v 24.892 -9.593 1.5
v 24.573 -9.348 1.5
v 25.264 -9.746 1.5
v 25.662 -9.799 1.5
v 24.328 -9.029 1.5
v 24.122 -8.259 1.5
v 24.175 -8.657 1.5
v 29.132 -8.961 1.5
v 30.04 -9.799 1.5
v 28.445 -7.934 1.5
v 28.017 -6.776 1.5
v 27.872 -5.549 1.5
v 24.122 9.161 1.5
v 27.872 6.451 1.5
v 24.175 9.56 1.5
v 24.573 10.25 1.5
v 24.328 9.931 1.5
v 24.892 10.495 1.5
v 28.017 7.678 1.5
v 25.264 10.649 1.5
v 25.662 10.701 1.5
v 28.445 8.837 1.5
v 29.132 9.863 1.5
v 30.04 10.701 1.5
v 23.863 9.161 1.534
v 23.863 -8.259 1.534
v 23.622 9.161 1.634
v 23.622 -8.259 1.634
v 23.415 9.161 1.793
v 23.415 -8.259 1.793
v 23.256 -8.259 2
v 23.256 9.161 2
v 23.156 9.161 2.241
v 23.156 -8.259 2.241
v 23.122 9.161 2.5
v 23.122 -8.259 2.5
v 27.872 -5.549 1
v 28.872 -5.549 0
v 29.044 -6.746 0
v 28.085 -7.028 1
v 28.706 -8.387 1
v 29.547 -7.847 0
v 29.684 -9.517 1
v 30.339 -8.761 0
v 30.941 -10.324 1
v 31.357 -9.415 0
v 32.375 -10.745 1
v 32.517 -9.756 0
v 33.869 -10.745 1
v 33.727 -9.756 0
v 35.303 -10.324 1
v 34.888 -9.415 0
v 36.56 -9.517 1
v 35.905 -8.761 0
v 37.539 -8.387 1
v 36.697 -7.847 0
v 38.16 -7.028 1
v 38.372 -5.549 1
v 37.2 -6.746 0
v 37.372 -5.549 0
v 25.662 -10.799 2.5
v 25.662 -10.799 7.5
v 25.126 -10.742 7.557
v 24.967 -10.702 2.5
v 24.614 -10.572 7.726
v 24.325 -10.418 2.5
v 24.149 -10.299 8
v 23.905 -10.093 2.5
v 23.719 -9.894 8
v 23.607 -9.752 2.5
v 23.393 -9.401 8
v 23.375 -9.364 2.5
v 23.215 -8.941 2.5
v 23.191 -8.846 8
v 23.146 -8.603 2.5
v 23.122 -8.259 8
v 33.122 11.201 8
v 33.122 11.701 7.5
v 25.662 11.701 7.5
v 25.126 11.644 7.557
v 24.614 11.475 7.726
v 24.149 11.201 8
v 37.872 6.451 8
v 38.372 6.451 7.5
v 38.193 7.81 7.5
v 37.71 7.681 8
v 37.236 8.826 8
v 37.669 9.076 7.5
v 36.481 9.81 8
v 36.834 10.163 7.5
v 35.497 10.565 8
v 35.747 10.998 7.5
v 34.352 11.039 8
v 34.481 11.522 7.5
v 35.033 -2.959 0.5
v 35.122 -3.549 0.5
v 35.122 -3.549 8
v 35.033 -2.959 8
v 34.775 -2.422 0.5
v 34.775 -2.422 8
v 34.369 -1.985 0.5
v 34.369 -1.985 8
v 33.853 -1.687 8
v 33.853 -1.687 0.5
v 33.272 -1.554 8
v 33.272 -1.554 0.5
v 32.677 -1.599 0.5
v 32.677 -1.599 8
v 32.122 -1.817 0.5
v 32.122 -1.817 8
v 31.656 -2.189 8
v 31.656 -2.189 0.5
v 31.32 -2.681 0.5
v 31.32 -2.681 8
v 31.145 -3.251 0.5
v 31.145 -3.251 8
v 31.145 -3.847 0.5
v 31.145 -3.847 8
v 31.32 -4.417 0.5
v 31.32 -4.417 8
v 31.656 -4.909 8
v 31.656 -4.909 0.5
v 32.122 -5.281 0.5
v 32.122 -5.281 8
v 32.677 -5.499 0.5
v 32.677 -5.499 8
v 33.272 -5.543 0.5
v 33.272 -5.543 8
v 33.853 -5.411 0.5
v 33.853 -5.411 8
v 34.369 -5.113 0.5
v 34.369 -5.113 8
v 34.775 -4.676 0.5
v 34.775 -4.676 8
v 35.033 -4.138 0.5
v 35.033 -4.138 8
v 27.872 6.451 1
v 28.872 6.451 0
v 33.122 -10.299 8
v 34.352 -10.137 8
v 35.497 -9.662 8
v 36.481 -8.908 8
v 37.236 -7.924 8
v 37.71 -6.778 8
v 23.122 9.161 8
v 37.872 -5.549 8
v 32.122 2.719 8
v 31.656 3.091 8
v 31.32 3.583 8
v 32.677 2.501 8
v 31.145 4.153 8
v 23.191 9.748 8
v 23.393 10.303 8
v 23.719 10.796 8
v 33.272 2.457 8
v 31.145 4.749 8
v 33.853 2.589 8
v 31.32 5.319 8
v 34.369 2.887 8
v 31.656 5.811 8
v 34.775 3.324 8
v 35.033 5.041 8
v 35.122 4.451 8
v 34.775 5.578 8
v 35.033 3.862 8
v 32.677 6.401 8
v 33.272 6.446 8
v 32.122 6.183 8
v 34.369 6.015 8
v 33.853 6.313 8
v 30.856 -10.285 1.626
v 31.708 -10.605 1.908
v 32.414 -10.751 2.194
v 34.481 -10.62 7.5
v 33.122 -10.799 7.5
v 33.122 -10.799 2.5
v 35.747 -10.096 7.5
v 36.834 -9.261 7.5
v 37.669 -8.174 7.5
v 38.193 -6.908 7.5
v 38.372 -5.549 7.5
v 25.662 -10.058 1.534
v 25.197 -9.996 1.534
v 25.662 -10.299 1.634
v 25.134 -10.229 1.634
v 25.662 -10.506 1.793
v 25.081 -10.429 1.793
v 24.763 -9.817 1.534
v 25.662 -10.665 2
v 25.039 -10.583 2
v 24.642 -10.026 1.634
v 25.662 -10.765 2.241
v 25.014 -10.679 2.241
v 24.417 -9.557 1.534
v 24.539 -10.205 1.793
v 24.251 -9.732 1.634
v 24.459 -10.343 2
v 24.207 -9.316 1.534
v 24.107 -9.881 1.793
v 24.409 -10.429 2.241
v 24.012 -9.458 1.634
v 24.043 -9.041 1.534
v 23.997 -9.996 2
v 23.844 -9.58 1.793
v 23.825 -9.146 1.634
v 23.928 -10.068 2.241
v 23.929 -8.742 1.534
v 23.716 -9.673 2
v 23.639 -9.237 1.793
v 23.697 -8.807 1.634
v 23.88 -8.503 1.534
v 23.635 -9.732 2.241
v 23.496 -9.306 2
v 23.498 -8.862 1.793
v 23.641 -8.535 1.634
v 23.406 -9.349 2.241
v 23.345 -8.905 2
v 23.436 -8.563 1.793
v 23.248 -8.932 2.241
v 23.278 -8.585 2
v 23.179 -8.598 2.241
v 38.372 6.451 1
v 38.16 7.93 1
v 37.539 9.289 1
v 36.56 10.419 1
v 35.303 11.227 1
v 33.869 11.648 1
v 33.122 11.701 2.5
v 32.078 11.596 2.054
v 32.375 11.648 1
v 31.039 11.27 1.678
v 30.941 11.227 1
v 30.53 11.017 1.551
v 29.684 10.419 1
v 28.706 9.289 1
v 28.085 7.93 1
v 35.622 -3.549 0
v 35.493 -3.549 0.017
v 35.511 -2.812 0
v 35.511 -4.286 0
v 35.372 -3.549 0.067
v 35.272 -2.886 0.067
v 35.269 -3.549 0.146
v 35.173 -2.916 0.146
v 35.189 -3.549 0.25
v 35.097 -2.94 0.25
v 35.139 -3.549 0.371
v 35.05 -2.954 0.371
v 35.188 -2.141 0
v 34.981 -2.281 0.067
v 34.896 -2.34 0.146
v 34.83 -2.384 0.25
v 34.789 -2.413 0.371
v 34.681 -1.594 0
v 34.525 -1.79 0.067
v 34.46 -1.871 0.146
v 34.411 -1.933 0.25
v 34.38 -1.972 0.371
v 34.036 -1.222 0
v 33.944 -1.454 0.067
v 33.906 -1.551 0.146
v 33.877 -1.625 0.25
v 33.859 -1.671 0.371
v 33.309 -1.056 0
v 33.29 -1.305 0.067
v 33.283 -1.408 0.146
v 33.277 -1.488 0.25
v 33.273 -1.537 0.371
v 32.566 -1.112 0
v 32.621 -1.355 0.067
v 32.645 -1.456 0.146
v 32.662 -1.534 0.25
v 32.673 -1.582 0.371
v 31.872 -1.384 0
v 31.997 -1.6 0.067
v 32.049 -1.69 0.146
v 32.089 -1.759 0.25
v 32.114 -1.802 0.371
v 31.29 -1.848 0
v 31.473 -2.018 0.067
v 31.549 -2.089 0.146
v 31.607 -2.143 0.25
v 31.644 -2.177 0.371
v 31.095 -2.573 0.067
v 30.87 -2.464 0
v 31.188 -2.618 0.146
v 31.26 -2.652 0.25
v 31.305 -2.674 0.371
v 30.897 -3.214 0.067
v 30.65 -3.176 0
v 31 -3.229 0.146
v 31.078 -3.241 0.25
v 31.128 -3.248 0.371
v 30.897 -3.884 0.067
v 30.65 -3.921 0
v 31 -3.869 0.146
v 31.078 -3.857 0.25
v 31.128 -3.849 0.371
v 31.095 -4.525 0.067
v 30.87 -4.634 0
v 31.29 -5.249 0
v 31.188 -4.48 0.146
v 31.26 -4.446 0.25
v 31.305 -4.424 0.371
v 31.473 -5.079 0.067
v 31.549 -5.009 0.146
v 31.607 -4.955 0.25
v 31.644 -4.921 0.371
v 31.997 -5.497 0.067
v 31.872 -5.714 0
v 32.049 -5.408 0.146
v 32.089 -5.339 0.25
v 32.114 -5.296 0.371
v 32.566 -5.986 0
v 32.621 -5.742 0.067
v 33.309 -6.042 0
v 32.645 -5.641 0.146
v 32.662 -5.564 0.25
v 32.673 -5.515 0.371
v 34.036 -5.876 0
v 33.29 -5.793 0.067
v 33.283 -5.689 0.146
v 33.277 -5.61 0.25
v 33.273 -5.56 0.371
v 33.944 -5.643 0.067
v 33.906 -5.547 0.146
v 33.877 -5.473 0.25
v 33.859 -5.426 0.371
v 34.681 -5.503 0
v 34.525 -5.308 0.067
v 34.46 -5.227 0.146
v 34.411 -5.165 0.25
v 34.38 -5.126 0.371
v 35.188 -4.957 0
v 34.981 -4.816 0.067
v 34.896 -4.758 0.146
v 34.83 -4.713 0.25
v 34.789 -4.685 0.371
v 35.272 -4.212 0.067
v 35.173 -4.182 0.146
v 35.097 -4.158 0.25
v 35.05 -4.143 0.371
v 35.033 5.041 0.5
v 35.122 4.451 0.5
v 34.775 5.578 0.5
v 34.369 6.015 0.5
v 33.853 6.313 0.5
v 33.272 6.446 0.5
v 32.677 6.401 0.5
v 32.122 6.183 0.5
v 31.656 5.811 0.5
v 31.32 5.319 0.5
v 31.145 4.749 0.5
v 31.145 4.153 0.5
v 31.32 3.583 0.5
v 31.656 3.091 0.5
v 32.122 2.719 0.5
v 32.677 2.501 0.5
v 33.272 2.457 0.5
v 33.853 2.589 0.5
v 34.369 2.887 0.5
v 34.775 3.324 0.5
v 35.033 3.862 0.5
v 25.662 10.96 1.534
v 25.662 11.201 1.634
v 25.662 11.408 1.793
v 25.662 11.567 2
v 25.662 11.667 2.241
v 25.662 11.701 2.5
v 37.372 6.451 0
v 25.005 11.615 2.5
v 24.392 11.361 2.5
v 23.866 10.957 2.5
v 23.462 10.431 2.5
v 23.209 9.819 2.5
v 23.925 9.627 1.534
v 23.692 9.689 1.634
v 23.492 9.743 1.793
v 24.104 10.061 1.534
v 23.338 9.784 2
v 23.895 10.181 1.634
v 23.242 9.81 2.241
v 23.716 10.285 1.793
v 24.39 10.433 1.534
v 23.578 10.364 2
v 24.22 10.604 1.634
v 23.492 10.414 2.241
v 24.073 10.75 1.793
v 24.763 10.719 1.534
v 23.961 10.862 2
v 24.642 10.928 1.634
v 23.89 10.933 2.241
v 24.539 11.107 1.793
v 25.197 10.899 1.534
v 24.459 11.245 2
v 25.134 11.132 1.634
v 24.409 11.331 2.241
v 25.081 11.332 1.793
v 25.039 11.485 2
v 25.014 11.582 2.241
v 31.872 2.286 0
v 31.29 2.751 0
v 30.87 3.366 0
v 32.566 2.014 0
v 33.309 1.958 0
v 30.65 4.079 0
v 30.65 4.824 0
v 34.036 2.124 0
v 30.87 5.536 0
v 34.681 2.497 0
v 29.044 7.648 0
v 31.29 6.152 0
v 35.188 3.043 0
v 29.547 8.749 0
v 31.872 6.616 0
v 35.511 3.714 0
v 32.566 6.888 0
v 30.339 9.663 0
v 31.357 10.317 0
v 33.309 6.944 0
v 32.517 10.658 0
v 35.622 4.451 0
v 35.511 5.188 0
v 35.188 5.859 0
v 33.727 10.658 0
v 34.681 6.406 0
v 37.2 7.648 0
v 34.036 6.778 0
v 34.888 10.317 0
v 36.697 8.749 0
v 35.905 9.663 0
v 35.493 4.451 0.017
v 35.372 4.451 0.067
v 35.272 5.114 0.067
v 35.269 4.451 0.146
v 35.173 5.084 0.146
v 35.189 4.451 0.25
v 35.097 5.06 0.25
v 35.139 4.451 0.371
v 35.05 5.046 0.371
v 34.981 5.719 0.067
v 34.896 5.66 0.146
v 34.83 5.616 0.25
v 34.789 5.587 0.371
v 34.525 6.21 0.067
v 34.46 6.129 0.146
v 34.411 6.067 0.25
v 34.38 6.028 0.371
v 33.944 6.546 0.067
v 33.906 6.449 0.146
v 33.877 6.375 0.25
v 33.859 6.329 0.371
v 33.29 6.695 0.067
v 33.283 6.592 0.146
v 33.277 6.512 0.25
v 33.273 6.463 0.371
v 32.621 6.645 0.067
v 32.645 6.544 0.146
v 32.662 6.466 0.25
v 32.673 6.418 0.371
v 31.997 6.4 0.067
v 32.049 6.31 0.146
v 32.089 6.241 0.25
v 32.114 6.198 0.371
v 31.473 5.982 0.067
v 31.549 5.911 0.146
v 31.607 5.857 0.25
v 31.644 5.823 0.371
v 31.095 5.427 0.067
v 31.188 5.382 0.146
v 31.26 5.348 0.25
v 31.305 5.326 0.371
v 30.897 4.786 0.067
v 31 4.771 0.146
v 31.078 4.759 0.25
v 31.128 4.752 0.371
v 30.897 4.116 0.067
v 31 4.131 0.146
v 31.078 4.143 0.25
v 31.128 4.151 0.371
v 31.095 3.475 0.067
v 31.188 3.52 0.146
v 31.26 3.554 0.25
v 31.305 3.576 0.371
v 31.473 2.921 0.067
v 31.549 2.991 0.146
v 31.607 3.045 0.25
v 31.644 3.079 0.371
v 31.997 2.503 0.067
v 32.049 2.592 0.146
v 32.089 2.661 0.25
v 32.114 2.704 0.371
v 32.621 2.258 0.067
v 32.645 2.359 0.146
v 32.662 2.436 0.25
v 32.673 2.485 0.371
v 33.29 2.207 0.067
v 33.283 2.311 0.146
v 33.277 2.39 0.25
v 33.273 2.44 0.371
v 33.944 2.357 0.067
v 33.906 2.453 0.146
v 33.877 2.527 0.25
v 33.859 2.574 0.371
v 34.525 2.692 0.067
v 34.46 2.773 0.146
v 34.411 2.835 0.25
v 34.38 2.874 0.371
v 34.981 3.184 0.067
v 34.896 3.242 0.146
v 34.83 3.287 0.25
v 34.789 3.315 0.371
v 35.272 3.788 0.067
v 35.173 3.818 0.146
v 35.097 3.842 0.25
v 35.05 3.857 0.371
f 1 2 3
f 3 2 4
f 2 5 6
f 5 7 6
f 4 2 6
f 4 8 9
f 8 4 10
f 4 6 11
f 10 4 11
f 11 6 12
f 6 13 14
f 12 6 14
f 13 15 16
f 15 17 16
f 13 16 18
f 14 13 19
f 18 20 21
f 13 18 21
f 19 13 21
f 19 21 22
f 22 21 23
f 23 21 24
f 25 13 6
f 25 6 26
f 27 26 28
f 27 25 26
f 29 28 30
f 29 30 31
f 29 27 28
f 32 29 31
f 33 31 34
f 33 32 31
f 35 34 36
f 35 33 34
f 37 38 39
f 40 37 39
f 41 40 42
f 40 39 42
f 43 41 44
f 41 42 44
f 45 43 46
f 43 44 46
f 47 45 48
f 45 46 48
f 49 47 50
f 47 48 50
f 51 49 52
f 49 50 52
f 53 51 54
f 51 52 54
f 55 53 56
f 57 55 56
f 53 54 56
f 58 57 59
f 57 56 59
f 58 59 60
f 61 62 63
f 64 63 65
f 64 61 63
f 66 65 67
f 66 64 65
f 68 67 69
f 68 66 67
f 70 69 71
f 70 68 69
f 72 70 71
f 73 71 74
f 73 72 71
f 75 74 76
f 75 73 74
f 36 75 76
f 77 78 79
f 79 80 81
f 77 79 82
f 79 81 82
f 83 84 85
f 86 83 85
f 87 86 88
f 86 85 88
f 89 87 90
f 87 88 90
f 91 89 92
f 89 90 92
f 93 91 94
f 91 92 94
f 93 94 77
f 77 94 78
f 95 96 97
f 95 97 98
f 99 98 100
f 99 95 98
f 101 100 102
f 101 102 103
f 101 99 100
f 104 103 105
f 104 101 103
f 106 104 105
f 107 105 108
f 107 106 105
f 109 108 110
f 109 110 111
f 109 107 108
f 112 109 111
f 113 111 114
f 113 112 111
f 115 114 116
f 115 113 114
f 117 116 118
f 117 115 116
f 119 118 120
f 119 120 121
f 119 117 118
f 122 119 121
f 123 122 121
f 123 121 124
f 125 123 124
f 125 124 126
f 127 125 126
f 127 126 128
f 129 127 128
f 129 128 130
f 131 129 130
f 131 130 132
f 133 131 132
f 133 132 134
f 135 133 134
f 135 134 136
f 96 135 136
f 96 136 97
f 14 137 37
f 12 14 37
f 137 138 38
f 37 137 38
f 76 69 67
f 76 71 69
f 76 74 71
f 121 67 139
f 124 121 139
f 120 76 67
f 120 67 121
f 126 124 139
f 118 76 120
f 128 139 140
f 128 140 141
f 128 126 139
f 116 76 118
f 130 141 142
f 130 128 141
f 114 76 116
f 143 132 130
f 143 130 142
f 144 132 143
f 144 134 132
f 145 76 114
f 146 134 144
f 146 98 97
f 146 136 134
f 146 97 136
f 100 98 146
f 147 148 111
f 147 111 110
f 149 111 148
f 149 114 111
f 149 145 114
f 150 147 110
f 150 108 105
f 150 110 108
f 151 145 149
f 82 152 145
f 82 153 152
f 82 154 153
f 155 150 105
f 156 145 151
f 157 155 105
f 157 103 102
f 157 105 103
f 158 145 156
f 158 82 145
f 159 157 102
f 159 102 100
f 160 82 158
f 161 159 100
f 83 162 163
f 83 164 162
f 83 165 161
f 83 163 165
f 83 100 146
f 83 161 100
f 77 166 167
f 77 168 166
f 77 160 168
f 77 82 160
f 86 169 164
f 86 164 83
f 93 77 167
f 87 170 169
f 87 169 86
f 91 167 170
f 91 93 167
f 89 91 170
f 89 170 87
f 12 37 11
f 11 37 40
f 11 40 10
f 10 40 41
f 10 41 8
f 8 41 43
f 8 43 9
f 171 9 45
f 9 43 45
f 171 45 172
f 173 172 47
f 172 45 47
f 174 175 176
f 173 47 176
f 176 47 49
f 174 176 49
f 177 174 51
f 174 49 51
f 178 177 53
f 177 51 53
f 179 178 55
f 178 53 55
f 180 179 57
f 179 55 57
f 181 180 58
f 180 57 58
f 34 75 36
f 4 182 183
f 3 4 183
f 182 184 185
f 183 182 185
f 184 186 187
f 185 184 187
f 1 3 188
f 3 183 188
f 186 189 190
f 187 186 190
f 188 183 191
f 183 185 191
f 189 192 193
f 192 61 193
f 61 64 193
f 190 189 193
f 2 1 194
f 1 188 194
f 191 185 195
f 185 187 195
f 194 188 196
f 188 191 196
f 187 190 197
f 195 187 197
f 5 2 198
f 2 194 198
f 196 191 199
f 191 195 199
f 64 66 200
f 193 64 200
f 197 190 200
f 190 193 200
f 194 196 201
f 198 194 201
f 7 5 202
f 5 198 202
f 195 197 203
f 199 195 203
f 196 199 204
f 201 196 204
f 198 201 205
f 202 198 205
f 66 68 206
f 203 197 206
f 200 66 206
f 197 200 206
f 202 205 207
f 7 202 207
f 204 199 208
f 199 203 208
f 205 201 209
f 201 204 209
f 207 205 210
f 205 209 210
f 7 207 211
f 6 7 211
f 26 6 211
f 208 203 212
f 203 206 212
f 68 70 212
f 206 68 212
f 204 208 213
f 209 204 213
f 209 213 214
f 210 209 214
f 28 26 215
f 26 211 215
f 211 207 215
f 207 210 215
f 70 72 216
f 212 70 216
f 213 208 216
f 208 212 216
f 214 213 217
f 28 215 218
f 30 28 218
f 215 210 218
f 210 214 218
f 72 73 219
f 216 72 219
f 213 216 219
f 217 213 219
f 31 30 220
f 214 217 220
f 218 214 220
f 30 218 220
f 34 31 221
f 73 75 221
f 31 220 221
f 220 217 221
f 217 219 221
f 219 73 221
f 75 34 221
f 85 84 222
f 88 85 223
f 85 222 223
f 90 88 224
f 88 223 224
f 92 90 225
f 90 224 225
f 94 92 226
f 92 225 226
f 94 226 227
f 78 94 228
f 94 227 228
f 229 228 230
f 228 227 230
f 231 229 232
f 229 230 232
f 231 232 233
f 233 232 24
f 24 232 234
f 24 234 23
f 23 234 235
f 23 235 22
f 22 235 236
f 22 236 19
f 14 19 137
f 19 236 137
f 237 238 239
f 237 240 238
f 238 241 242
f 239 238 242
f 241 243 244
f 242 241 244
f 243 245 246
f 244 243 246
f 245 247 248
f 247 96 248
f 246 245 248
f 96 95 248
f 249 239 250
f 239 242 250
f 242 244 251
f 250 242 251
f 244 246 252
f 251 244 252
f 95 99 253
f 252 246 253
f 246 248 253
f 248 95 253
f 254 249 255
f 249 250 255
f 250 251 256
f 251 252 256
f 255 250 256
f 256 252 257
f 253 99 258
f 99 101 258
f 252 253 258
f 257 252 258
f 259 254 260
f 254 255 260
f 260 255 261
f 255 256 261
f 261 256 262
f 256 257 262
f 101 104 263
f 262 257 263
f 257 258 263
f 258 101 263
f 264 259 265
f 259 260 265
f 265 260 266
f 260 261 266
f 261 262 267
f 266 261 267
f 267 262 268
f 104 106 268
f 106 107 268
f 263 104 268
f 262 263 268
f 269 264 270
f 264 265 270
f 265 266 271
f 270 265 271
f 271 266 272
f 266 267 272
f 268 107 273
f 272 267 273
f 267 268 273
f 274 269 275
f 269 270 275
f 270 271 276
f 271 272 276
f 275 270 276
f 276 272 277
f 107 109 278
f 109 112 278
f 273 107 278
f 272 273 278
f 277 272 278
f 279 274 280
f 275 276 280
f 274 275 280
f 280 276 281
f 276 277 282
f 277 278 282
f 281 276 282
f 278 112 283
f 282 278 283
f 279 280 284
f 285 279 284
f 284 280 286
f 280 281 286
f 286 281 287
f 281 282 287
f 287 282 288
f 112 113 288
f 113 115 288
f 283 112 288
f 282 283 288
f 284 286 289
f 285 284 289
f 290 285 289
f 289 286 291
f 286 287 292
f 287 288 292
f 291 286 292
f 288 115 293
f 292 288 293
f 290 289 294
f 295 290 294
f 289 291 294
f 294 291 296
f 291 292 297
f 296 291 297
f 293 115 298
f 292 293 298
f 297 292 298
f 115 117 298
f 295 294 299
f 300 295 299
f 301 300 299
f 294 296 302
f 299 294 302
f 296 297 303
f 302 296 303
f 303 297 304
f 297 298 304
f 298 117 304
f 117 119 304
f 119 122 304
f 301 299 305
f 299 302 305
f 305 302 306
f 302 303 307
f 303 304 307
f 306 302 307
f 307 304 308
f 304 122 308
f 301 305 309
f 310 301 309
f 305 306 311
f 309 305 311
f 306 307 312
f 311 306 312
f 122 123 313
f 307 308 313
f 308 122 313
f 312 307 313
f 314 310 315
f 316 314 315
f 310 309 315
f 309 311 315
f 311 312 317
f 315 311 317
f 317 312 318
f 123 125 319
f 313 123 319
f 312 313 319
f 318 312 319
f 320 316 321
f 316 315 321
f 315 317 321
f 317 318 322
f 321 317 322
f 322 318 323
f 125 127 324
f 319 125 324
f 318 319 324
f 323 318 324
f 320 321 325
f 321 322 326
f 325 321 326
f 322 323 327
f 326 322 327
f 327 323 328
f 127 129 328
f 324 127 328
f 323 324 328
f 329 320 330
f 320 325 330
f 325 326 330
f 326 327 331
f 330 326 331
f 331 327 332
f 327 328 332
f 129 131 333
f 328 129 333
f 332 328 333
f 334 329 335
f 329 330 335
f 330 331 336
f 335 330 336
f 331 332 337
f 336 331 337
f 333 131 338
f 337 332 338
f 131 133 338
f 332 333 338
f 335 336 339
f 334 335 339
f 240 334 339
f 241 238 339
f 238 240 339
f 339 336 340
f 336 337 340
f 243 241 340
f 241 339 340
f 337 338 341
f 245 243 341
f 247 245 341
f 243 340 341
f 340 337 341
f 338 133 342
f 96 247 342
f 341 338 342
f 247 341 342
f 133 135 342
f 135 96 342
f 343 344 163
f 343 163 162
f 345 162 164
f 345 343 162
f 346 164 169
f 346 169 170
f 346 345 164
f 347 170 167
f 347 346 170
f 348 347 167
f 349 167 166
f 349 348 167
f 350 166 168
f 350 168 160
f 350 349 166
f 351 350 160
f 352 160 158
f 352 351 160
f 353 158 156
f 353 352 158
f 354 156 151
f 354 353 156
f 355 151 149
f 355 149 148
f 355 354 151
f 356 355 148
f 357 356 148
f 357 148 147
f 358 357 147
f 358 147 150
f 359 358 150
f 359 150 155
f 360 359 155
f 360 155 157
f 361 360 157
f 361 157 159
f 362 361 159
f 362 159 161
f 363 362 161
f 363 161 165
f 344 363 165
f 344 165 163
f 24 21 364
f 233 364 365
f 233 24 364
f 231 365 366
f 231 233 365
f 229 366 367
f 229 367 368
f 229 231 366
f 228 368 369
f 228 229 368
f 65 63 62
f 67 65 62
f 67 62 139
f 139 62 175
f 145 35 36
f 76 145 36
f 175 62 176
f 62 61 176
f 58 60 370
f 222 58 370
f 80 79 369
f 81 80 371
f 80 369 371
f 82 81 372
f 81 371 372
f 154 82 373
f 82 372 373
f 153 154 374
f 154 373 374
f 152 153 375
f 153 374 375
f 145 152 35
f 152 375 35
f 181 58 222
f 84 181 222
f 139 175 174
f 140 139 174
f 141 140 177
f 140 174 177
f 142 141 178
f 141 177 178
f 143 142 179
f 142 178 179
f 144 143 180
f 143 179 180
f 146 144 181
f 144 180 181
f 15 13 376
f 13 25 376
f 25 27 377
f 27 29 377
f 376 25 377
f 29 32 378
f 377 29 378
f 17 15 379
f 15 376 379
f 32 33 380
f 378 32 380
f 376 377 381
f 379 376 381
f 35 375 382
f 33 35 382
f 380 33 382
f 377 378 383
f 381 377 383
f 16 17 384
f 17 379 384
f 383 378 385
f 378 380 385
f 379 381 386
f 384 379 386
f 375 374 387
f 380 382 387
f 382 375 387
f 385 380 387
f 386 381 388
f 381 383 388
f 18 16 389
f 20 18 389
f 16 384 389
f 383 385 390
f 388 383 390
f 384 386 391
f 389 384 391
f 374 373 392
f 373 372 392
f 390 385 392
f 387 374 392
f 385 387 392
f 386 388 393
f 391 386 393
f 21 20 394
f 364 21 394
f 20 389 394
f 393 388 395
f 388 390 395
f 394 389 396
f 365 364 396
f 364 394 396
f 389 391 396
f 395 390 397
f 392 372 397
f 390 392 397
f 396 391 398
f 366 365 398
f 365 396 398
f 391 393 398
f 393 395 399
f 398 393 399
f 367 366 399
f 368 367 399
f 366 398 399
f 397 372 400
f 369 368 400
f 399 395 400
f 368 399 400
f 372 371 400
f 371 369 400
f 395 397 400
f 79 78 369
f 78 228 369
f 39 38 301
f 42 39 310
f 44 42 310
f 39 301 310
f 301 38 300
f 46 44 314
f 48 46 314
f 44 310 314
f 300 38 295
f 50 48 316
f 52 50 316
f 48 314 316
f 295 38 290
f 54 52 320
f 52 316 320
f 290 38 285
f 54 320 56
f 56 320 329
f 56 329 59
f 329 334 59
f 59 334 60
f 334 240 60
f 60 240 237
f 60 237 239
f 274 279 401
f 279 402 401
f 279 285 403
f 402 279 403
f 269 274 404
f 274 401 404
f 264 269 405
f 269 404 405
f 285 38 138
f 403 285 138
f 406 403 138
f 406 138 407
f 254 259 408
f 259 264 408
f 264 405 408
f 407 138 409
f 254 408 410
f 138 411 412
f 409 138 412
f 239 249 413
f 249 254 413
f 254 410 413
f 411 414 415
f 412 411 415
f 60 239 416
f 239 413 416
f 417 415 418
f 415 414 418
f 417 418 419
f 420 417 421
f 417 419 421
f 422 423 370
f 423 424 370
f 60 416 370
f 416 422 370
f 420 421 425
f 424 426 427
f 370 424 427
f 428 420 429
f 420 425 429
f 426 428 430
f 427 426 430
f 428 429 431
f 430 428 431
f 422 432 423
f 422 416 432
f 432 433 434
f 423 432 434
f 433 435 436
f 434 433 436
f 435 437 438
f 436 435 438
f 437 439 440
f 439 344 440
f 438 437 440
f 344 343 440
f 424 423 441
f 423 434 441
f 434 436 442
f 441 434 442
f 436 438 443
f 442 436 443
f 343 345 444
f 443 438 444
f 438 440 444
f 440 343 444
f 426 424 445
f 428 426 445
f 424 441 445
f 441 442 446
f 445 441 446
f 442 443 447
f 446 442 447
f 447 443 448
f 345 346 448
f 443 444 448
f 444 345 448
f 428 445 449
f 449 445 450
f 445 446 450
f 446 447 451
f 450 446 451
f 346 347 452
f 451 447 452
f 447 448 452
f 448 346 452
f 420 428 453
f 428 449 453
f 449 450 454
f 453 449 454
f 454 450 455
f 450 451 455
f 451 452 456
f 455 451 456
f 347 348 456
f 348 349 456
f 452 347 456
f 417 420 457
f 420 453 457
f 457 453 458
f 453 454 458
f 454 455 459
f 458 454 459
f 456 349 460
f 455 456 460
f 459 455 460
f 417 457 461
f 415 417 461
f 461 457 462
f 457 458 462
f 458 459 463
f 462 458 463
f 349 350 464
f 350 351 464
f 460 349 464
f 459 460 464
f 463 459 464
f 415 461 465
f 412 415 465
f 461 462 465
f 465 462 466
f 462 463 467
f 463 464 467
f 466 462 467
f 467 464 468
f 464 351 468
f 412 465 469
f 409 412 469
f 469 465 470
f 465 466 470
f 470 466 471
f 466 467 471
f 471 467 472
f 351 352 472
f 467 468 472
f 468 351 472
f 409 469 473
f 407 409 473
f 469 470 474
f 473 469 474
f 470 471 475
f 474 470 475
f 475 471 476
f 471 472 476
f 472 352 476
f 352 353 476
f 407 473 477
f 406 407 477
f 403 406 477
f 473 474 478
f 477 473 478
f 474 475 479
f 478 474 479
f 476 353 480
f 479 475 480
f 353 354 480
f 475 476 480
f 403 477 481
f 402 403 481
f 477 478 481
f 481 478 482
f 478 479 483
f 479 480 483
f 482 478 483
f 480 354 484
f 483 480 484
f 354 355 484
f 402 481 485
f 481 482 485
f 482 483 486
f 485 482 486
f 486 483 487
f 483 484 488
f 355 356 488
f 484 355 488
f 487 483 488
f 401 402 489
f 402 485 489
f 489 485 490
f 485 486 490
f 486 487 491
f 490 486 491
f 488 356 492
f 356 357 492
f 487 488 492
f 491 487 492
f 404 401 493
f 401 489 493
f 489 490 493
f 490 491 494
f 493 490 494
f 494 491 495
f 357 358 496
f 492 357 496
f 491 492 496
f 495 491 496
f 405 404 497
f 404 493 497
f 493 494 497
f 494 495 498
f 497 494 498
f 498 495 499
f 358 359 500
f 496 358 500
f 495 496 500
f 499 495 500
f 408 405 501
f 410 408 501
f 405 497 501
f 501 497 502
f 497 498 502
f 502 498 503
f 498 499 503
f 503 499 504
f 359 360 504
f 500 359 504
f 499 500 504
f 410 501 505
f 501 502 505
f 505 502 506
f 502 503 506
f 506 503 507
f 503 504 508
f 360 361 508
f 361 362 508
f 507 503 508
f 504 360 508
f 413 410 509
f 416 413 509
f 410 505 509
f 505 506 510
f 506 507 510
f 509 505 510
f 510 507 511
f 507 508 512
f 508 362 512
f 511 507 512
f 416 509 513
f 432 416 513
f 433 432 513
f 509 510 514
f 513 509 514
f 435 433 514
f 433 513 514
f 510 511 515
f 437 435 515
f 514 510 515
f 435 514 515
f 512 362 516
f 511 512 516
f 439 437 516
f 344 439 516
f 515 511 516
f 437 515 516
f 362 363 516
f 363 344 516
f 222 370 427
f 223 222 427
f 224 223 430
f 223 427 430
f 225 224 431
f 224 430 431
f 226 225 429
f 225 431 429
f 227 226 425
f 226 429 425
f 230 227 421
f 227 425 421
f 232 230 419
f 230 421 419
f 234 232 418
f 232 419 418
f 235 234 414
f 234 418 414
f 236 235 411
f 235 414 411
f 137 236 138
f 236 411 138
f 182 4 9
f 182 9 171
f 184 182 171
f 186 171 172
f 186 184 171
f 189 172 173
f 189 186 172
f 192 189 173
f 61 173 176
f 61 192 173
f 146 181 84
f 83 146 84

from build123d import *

# Parameters (mm, degrees)
F0_R         = 2
F1_DEPTH     = 1.5
F2_R         = 2
F3_DEPTH     = 6.5
F4_SIZE      = 1
F5_T1_DEPTH  = 27.5
F5_T6_DEPTH  = 16.75
F5_S7_R      = 5.25
F5_T8_DEPTH  = 10
F5_T12_DEPTH = 16.75
F5_S13_R     = 5.25
F5_T14_DEPTH = 10
F6_SIZE      = 0.5
F7_R         = 0.5
F8_T1_DEPTH  = 12.35
F8_T4_ANGLE  = 90
F8_T6_ANGLE  = 90


# Not quite as in the source:
# - a fillet or chamfer that OpenCascade refuses, or shapes differently, is made with other operations: its cross-section is extruded or revolved along the edge and cut away or added


with BuildPart() as f1:
    # F0 (on Top) → F1 (new body)
    with BuildSketch(Plane.XY):
        with BuildLine():
            ThreePointArc((38.3721691668, 6.4511308521), (33.1221691668, 11.7011308521), (27.8721691668, 6.4511308521))
            Line((27.8721691668, 6.4511308521), (27.8721691668, -5.5488691479))
            ThreePointArc((27.8721691668, -5.5488691479), (33.1221691668, -10.7988691479), (38.3721691668, -5.5488691479))
            Line((38.3721691668, -5.5488691479), (38.3721691668, 6.4511308521))
        make_face()
        with Locations((33.1221691668, -3.5488691479)):
            Circle(F0_R, mode=Mode.SUBTRACT)
        with Locations((33.1221691668, 4.4511308521)):
            Circle(F0_R, mode=Mode.SUBTRACT)
    extrude(amount=F1_DEPTH)

    # F2 (on face) → F3 (join)
    with BuildSketch(Plane.XY.offset(1.5)):
        with BuildLine():
            Line((38.3721691668, -5.5488691479), (38.3721691668, 6.4511308521))
            ThreePointArc((38.3721691668, 6.4511308521), (36.834479768, 10.1634414533), (33.1221691668, 11.7011308521))
            Line((33.1221691668, 11.7011308521), (23.1221691668, 11.7011308521))
            Line((23.1221691668, 11.7011308521), (23.1221691668, -10.7988691479))
            Line((23.1221691668, -10.7988691479), (33.1221691668, -10.7988691479))
            ThreePointArc((33.1221691668, -10.7988691479), (36.834479768, -9.2611797491), (38.3721691668, -5.5488691479))
        make_face()
        with Locations((33.1221691668, -3.5488691479)):
            Circle(F2_R, mode=Mode.SUBTRACT)
        with Locations((33.1221691668, 4.4511308521)):
            Circle(F2_R, mode=Mode.SUBTRACT)
    extrude(amount=F3_DEPTH)

    # F4
    f4_edges = [f1.edges().sort_by_distance(p)[0] for p in [
        (27.872169, 0.451131, 0),
        (38.372169, 0.451131, 0),
        (33.122169, 11.701131, 0),
        (33.122169, -10.798869, 0),
    ]]
    chamfer(f4_edges, length=F4_SIZE)

    # F5: fillet of radius 1 on 3 edges, made by hand

    # F5_s2 → F5_t1 (cut)
    with BuildSketch(Plane.XZ.offset(-14.2011308521)):
        with BuildLine():
            ThreePointArc((24.1221691668, 1.5), (23.4150623856, 1.7928932188), (23.1221691668, 2.5))
            Line((23.1221691668, 2.5), (23.1221691668, 1.5))
            Line((23.1221691668, 1.5), (24.1221691668, 1.5))
        make_face()
    extrude(amount=F5_T1_DEPTH, mode=Mode.SUBTRACT)


with BuildPart() as f5_tool4:
    # F5_s5 → F5_t6 (new body)
    with BuildSketch(Plane.YZ.offset(37.3721691668)):
        with BuildLine():
            ThreePointArc((10.7011308521, 1.5), (11.4082376333, 1.7928932188), (11.7011308521, 2.5))
            Line((11.7011308521, 2.5), (11.7011308521, 1.5))
            Line((11.7011308521, 1.5), (10.7011308521, 1.5))
        make_face()
    extrude(amount=-F5_T6_DEPTH)

    # F5_s7 → F5_t8 (cut, symmetric)
    with BuildSketch(Plane.XY.offset(2)):
        with Locations((33.1221691668, 6.4511308521)):
            Circle(F5_S7_R)
    extrude(amount=F5_T8_DEPTH, both=True, mode=Mode.SUBTRACT)


with BuildPart() as f1_1:
    add(f1.part)

    # F5_t3: cut F5_tool4
    add(f5_tool4.part, mode=Mode.SUBTRACT)


with BuildPart() as f5_tool10:
    # F5_s11 → F5_t12 (new body)
    with BuildSketch(Plane.YZ.offset(20.6221691668)):
        with BuildLine():
            ThreePointArc((-9.7988691479, 1.5), (-10.5059759291, 1.7928932188), (-10.7988691479, 2.5))
            Line((-10.7988691479, 2.5), (-10.7988691479, 1.5))
            Line((-10.7988691479, 1.5), (-9.7988691479, 1.5))
        make_face()
    extrude(amount=F5_T12_DEPTH)

    # F5_s13 → F5_t14 (cut, symmetric)
    with BuildSketch(Plane.XY.offset(2)):
        with Locations((33.1221691668, -5.5488691479)):
            Circle(F5_S13_R)
    extrude(amount=F5_T14_DEPTH, both=True, mode=Mode.SUBTRACT)


with BuildPart() as f1_2:
    add(f1_1.part)

    # F5_t9: cut F5_tool10
    add(f5_tool10.part, mode=Mode.SUBTRACT)

    # F6
    f6_edges = [f1_2.edges().sort_by_distance(p)[0] for p in [
        (28.122169, 11.701131, 8),
        (38.372169, 0.451131, 8),
        (36.83448, -9.26118, 8),
        (36.83448, 10.163441, 8),
        (28.122169, -10.798869, 8),
    ]]
    chamfer(f6_edges, length=F6_SIZE)

    # F7
    f7_edges = [f1_2.edges().sort_by_distance(p)[0] for p in [
        (31.122169, -3.548869, 0),
        (31.122169, 4.451131, 0),
    ]]
    fillet(f7_edges, radius=F7_R)

    # F8: fillet of radius 2.54 on 2 edges, made by hand

    # F8_s2 → F8_t1 (cut)
    with BuildSketch(Plane.XY.offset(1.5)):
        with BuildLine():
            ThreePointArc((25.6621691668, 11.7011308521), (23.8661179426, 10.9571820763), (23.1221691668, 9.1611308521))
            Line((23.1221691668, 9.1611308521), (23.1221691668, 11.7011308521))
            Line((23.1221691668, 11.7011308521), (25.6621691668, 11.7011308521))
        make_face()
        with BuildLine():
            ThreePointArc((25.6621691668, -10.7988691479), (23.8661179426, -10.0549203721), (23.1221691668, -8.2588691479))
            Line((23.1221691668, -8.2588691479), (23.1221691668, -10.7988691479))
            Line((23.1221691668, -10.7988691479), (25.6621691668, -10.7988691479))
        make_face()
    extrude(amount=F8_T1_DEPTH, mode=Mode.SUBTRACT)

    # F8_s3 → F8_t4 (revolve, cut)
    with BuildSketch(Plane.YZ.offset(25.6621691668)):
        with BuildLine():
            ThreePointArc((-9.7988691479, 1.5), (-10.5059759291, 1.7928932188), (-10.7988691479, 2.5))
            Line((-10.7988691479, 2.5), (-10.7988691479, 1.5))
            Line((-10.7988691479, 1.5), (-9.7988691479, 1.5))
        make_face()
    revolve(axis=Axis((25.6621691668, -8.2588691479, 1.5), (0, 0, -1)), revolution_arc=F8_T4_ANGLE, mode=Mode.SUBTRACT)

    # F8_s5 → F8_t6 (revolve, cut)
    with BuildSketch(Plane.XZ.offset(-9.1611308521)):
        with BuildLine():
            ThreePointArc((24.1221691668, 1.5), (23.4150623856, 1.7928932188), (23.1221691668, 2.5))
            Line((23.1221691668, 2.5), (23.1221691668, 1.5))
            Line((23.1221691668, 1.5), (24.1221691668, 1.5))
        make_face()
    revolve(axis=Axis((25.6621691668, 9.1611308521, 1.5), (0, 0, -1)), revolution_arc=F8_T6_ANGLE, mode=Mode.SUBTRACT)


solid = f1_2.part
